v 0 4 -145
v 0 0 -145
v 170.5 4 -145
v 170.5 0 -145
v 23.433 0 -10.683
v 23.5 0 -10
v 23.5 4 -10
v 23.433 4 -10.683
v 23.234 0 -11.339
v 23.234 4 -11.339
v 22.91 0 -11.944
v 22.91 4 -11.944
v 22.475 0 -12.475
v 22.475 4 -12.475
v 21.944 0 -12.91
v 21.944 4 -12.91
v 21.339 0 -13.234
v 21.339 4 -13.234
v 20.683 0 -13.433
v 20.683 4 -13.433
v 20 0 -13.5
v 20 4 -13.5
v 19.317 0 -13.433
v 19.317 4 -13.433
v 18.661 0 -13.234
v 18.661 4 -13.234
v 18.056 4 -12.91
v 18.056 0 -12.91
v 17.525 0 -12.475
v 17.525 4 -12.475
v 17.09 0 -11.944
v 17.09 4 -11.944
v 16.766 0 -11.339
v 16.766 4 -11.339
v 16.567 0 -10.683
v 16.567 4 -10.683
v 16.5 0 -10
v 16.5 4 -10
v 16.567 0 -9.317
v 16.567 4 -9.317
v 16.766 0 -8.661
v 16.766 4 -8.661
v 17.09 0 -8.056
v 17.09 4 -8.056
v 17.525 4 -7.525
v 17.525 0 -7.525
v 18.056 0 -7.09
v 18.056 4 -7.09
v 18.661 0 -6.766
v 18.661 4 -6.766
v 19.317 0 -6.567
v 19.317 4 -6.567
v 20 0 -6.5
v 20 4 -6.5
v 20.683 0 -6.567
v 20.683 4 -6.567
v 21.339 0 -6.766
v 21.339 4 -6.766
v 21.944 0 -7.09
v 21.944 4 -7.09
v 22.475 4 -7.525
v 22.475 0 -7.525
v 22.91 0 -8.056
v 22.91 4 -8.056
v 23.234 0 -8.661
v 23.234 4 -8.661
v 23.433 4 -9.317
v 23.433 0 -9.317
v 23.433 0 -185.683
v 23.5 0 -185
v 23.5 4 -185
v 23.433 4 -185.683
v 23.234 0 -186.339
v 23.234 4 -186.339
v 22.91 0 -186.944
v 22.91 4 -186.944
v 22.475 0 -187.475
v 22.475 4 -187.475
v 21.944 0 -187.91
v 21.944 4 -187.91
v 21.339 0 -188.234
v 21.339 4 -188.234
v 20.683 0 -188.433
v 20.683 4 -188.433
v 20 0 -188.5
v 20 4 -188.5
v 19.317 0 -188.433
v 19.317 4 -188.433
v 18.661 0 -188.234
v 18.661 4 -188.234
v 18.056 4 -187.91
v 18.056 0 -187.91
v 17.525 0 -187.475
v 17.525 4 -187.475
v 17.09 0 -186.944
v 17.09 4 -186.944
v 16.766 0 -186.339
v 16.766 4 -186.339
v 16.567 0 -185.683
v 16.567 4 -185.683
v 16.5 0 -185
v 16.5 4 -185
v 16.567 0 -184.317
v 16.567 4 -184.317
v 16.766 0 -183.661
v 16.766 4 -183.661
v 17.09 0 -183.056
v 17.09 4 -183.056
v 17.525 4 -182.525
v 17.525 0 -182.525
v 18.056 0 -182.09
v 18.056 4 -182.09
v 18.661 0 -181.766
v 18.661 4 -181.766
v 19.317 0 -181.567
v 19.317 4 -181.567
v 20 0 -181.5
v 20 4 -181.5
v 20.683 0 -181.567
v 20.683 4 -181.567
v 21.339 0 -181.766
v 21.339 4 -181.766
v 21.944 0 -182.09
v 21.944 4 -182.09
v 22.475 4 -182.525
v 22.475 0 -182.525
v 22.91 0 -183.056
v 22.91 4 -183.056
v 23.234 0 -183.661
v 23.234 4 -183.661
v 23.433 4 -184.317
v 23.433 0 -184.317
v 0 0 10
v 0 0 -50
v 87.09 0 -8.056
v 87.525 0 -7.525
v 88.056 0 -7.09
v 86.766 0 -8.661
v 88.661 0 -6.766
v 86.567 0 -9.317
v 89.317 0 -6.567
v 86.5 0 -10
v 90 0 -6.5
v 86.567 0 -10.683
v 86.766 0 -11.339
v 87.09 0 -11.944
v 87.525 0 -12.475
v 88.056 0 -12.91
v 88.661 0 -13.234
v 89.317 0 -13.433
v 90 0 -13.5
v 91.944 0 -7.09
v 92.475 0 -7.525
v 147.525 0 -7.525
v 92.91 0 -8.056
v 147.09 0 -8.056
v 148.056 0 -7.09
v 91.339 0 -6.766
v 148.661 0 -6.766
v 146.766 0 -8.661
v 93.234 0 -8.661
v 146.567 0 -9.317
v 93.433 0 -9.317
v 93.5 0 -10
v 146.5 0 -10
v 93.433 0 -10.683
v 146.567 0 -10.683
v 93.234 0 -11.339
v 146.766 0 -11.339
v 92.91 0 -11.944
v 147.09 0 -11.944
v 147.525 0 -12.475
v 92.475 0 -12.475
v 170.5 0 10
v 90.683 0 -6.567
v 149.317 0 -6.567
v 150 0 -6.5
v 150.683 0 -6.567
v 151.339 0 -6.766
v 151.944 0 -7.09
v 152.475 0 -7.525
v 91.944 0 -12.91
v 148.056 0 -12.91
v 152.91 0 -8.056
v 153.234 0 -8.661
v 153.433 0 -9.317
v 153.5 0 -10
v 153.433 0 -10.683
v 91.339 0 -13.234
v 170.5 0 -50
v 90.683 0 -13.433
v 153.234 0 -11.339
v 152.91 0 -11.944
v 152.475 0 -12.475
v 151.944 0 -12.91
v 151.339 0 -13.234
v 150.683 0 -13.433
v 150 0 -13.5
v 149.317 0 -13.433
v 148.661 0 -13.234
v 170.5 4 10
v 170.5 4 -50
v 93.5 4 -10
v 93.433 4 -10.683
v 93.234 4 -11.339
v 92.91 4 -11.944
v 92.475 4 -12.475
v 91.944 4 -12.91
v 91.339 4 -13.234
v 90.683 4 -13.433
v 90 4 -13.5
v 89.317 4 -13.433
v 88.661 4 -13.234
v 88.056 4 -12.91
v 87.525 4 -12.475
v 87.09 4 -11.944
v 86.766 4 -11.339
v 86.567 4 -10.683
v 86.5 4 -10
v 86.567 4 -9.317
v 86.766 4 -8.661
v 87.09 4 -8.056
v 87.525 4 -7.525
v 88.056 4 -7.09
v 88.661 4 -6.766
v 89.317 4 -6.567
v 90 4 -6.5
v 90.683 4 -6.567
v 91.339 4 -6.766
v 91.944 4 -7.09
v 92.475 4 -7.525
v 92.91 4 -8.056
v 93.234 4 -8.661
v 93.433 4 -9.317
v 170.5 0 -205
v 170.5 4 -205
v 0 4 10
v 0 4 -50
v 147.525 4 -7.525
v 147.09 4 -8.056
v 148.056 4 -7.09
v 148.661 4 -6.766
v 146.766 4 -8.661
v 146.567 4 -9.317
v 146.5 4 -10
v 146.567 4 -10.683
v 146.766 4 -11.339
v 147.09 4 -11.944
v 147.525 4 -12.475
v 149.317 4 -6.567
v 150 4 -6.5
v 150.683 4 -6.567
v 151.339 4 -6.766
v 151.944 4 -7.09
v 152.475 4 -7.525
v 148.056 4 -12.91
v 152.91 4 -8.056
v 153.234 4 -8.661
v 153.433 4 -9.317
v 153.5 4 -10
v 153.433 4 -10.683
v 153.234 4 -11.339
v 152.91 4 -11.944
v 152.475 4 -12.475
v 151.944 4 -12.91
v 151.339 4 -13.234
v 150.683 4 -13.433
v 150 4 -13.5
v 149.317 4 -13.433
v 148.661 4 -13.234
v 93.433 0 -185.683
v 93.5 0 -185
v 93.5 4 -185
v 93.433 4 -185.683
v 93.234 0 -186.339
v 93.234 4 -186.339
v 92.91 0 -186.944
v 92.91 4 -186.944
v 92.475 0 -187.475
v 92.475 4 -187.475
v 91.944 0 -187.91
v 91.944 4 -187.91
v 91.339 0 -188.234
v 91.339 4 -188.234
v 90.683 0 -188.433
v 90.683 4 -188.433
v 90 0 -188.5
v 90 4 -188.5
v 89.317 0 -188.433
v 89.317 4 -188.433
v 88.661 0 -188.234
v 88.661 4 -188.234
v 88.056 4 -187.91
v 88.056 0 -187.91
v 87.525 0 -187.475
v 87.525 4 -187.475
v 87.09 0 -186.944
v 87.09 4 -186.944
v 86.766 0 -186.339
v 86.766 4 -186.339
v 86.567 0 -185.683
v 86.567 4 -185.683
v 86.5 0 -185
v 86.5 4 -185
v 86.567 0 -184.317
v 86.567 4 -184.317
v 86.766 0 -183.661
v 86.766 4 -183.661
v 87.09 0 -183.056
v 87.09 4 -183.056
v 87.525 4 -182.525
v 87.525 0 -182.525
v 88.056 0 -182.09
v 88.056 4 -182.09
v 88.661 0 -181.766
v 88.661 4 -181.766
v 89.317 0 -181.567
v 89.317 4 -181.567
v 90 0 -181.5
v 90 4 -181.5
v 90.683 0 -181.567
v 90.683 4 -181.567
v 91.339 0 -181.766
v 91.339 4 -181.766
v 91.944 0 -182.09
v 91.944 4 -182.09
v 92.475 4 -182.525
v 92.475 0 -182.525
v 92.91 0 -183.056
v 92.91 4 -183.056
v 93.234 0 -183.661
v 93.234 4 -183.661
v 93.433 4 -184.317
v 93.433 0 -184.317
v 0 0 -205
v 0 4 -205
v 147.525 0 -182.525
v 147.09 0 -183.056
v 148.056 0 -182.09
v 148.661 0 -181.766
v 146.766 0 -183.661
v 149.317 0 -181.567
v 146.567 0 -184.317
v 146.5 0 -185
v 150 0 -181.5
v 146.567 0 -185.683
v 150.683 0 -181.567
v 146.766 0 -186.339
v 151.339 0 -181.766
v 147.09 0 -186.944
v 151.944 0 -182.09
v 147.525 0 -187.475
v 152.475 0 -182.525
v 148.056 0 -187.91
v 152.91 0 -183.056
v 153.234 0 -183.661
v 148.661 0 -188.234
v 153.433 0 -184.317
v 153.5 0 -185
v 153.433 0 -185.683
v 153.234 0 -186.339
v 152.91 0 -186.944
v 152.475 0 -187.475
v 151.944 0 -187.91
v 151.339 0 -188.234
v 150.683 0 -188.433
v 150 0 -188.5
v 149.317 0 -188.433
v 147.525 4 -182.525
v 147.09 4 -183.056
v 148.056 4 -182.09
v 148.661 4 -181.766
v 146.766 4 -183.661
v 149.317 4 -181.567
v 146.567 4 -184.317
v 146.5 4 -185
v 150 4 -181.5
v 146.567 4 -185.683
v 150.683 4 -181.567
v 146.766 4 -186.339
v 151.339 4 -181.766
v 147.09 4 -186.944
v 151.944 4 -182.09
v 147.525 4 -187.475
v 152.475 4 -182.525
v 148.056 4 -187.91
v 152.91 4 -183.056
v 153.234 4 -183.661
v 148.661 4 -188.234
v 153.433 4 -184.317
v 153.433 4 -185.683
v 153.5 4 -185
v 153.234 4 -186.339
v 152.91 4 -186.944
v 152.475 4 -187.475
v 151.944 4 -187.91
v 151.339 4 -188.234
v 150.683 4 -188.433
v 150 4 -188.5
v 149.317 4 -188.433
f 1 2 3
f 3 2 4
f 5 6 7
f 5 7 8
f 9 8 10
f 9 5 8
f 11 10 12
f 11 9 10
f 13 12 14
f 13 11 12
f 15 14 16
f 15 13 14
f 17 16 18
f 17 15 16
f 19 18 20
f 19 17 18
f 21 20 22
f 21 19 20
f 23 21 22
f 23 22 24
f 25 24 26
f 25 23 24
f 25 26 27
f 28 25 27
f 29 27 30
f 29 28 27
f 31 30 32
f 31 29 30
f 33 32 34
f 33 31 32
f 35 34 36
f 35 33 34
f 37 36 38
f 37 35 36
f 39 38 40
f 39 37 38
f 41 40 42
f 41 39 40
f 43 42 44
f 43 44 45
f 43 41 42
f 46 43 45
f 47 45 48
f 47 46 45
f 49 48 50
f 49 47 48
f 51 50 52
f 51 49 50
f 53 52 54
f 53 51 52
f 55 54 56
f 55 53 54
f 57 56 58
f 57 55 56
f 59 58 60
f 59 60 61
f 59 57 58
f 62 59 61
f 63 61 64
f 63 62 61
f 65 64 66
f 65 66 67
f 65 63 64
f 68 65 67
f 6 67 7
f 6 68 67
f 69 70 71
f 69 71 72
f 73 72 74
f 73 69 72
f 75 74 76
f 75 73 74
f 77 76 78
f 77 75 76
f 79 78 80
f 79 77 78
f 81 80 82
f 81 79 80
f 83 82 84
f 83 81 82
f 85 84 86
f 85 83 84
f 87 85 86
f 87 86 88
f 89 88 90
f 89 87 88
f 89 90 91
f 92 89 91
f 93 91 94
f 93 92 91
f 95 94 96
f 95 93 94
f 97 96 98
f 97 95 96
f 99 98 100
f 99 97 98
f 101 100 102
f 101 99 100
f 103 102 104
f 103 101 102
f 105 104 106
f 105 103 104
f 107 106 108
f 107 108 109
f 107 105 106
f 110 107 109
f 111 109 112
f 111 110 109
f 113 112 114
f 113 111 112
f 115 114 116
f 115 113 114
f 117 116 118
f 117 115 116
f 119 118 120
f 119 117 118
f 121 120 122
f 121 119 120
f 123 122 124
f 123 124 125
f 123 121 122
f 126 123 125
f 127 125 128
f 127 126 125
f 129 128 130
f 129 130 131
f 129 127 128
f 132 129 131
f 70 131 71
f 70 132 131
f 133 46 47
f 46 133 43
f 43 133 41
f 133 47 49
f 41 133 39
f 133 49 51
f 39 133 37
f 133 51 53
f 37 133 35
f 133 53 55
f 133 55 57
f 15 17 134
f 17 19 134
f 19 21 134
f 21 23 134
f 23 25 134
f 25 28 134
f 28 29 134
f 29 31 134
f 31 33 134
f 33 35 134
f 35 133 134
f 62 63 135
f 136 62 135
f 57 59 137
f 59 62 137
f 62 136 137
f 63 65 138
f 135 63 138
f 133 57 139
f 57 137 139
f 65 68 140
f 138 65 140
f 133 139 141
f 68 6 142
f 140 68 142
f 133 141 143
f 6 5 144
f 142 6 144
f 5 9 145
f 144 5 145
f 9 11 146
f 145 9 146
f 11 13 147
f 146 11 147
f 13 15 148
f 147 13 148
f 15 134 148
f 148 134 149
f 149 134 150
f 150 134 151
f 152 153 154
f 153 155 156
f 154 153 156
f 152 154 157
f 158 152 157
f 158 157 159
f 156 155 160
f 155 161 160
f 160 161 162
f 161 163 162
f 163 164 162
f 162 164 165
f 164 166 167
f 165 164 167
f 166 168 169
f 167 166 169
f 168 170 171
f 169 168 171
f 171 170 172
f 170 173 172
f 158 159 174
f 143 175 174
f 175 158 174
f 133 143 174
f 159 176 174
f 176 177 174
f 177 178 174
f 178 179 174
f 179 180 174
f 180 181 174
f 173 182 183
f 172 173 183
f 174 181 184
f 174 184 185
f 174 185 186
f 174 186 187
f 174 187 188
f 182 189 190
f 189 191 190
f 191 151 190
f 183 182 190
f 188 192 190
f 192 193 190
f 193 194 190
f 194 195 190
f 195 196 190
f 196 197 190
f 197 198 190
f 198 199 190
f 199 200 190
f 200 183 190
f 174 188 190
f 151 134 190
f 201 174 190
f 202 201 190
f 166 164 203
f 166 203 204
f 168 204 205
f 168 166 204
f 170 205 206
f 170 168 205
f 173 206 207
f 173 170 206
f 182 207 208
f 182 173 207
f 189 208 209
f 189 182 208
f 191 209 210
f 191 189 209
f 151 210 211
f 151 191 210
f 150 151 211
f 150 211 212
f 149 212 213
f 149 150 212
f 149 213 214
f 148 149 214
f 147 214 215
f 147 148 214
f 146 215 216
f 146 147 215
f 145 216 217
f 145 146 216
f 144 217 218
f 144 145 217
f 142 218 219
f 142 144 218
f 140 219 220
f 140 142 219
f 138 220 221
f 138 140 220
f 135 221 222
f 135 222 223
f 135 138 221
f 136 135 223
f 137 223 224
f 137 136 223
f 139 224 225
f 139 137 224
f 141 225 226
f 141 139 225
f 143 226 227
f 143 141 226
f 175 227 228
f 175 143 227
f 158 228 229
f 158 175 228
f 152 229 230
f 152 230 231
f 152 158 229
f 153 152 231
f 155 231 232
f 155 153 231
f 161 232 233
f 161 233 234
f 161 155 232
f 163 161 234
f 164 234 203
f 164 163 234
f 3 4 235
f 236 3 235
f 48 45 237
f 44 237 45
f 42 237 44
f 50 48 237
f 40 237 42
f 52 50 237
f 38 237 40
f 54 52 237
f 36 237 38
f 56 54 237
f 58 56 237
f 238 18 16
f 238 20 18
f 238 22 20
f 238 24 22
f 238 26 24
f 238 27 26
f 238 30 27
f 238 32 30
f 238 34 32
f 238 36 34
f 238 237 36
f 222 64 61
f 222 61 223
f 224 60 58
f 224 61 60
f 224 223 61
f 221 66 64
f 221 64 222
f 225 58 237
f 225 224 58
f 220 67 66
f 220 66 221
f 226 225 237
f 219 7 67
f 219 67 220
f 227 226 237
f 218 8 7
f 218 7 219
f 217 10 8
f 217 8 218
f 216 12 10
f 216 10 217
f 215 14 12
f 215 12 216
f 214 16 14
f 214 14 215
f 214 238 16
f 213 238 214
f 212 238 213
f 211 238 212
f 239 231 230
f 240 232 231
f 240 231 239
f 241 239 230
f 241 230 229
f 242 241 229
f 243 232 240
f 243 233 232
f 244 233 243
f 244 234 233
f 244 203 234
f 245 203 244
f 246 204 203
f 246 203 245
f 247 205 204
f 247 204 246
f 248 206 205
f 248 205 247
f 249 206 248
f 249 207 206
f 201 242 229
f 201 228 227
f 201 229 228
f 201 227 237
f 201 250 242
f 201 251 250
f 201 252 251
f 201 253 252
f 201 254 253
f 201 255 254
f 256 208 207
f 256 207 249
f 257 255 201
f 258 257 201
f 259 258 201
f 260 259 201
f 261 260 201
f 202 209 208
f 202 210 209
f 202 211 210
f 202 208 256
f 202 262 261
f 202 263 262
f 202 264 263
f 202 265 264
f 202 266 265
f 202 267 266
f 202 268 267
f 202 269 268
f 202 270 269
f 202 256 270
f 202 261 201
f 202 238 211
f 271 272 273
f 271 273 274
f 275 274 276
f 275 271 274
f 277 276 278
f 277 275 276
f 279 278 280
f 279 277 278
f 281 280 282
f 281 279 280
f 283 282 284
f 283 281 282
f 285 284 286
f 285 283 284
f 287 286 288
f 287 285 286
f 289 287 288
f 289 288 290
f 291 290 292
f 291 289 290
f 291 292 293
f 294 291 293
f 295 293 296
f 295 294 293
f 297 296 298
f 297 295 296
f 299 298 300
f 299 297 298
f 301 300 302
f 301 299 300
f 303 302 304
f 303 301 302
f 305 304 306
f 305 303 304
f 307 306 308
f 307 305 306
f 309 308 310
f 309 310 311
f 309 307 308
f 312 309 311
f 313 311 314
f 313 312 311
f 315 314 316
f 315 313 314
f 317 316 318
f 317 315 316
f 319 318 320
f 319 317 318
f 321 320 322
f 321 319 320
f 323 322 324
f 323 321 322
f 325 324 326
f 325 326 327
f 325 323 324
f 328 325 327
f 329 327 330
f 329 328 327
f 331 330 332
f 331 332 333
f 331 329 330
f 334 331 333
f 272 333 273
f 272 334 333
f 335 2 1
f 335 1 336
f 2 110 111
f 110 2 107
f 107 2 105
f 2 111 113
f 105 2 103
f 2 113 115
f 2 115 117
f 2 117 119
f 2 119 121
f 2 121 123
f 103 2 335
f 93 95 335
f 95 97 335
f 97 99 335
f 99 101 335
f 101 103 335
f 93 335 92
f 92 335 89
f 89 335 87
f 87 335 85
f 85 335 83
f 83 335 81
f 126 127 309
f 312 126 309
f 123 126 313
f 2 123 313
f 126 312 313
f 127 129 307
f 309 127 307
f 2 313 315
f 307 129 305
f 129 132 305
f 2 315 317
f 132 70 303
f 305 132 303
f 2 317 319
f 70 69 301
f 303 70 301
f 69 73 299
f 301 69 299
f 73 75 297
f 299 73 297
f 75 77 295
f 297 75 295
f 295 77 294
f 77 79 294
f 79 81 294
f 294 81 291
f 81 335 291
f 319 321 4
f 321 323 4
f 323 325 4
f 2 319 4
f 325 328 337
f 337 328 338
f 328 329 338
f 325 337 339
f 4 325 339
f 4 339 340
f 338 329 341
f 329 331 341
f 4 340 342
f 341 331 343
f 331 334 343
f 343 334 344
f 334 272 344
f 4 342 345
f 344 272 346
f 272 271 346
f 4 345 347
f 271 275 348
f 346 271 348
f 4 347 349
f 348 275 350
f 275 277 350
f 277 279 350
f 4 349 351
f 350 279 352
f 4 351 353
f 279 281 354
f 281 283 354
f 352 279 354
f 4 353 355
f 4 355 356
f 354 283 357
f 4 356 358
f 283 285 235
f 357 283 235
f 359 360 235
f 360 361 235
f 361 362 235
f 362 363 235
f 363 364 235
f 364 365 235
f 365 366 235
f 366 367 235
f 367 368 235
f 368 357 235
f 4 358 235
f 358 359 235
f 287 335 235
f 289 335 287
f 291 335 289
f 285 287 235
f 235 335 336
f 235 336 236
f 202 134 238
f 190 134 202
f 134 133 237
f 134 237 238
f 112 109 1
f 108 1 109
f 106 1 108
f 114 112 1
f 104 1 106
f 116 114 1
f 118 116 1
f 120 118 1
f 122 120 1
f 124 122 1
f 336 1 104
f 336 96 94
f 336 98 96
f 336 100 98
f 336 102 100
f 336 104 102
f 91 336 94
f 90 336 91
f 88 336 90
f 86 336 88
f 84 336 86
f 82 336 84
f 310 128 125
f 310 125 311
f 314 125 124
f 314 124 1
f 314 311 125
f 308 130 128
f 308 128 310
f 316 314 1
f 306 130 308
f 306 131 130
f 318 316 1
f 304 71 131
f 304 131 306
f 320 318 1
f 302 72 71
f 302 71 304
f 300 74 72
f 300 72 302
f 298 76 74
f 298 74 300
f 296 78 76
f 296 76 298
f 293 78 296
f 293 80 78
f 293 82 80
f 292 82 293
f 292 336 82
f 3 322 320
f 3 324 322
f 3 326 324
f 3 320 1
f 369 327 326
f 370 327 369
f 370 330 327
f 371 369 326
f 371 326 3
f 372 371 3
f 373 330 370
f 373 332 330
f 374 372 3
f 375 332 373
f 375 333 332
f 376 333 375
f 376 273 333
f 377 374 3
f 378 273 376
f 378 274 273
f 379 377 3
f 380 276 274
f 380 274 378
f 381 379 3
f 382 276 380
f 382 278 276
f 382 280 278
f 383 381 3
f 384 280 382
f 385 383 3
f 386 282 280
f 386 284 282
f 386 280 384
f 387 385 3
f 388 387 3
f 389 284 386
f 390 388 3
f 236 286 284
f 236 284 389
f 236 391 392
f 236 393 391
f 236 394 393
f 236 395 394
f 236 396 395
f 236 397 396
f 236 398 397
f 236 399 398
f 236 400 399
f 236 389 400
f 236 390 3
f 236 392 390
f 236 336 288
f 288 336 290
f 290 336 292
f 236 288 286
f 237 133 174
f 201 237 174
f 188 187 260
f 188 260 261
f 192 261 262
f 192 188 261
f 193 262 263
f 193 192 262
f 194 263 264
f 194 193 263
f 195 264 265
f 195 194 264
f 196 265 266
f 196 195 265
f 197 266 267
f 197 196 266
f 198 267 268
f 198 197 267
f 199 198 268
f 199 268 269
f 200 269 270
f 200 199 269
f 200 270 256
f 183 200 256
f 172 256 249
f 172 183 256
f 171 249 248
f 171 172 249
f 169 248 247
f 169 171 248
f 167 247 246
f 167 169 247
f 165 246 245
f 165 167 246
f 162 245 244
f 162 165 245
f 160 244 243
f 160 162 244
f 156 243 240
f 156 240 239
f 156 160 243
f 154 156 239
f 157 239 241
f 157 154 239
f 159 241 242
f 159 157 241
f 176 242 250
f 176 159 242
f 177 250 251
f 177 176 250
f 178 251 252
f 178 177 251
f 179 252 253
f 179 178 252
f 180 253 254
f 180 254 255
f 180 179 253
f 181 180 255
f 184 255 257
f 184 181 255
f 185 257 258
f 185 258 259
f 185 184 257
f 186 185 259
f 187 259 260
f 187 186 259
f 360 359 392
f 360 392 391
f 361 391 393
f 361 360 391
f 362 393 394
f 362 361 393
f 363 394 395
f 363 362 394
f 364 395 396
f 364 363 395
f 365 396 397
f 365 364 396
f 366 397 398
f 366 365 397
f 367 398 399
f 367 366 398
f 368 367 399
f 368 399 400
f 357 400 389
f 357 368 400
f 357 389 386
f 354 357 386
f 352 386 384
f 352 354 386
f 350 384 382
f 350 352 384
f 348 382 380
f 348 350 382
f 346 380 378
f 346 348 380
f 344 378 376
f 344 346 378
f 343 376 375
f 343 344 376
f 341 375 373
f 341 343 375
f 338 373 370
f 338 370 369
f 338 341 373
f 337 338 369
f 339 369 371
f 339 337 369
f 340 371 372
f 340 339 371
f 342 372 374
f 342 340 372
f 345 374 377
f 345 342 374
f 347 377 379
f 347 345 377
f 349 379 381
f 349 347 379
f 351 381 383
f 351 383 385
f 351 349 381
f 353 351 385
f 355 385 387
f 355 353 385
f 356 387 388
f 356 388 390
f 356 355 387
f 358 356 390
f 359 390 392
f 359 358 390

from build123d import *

# Parameters (mm, degrees)
SKETCH1_W           = 170.5
SKETCH1_H           = 215
SKETCH1_R           = 3.5
BOSS_EXTRUDE1_DEPTH = 4
SKETCH2_W           = 219.467368697
SKETCH2_H           = 95
CUT_EXTRUDE1_DEPTH  = 10


with BuildPart() as part:
    # Sketch1 → Boss-Extrude1 (new body)
    with BuildSketch(Plane(origin=(0, 0, 0), x_dir=(1, 0, 0), z_dir=(0, 1, 0))):
        with Locations((85.25, 97.5)):
            Rectangle(SKETCH1_W, SKETCH1_H)
        with Locations((20, 10)):
            Circle(SKETCH1_R, mode=Mode.SUBTRACT)
        with Locations((150, 10)):
            Circle(SKETCH1_R, mode=Mode.SUBTRACT)
        with Locations((90, 10)):
            Circle(SKETCH1_R, mode=Mode.SUBTRACT)
        with Locations((20, 185)):
            Circle(SKETCH1_R, mode=Mode.SUBTRACT)
        with Locations((90, 185)):
            Circle(SKETCH1_R, mode=Mode.SUBTRACT)
        with Locations((150, 185)):
            Circle(SKETCH1_R, mode=Mode.SUBTRACT)
    extrude(amount=BOSS_EXTRUDE1_DEPTH)

    # Sketch2 → Cut-Extrude1 (cut)
    with BuildSketch(Plane.XZ):
        with Locations((84.733684349, -97.5)):
            Rectangle(SKETCH2_W, SKETCH2_H)
    extrude(amount=-CUT_EXTRUDE1_DEPTH, mode=Mode.SUBTRACT)


solid = part.part
